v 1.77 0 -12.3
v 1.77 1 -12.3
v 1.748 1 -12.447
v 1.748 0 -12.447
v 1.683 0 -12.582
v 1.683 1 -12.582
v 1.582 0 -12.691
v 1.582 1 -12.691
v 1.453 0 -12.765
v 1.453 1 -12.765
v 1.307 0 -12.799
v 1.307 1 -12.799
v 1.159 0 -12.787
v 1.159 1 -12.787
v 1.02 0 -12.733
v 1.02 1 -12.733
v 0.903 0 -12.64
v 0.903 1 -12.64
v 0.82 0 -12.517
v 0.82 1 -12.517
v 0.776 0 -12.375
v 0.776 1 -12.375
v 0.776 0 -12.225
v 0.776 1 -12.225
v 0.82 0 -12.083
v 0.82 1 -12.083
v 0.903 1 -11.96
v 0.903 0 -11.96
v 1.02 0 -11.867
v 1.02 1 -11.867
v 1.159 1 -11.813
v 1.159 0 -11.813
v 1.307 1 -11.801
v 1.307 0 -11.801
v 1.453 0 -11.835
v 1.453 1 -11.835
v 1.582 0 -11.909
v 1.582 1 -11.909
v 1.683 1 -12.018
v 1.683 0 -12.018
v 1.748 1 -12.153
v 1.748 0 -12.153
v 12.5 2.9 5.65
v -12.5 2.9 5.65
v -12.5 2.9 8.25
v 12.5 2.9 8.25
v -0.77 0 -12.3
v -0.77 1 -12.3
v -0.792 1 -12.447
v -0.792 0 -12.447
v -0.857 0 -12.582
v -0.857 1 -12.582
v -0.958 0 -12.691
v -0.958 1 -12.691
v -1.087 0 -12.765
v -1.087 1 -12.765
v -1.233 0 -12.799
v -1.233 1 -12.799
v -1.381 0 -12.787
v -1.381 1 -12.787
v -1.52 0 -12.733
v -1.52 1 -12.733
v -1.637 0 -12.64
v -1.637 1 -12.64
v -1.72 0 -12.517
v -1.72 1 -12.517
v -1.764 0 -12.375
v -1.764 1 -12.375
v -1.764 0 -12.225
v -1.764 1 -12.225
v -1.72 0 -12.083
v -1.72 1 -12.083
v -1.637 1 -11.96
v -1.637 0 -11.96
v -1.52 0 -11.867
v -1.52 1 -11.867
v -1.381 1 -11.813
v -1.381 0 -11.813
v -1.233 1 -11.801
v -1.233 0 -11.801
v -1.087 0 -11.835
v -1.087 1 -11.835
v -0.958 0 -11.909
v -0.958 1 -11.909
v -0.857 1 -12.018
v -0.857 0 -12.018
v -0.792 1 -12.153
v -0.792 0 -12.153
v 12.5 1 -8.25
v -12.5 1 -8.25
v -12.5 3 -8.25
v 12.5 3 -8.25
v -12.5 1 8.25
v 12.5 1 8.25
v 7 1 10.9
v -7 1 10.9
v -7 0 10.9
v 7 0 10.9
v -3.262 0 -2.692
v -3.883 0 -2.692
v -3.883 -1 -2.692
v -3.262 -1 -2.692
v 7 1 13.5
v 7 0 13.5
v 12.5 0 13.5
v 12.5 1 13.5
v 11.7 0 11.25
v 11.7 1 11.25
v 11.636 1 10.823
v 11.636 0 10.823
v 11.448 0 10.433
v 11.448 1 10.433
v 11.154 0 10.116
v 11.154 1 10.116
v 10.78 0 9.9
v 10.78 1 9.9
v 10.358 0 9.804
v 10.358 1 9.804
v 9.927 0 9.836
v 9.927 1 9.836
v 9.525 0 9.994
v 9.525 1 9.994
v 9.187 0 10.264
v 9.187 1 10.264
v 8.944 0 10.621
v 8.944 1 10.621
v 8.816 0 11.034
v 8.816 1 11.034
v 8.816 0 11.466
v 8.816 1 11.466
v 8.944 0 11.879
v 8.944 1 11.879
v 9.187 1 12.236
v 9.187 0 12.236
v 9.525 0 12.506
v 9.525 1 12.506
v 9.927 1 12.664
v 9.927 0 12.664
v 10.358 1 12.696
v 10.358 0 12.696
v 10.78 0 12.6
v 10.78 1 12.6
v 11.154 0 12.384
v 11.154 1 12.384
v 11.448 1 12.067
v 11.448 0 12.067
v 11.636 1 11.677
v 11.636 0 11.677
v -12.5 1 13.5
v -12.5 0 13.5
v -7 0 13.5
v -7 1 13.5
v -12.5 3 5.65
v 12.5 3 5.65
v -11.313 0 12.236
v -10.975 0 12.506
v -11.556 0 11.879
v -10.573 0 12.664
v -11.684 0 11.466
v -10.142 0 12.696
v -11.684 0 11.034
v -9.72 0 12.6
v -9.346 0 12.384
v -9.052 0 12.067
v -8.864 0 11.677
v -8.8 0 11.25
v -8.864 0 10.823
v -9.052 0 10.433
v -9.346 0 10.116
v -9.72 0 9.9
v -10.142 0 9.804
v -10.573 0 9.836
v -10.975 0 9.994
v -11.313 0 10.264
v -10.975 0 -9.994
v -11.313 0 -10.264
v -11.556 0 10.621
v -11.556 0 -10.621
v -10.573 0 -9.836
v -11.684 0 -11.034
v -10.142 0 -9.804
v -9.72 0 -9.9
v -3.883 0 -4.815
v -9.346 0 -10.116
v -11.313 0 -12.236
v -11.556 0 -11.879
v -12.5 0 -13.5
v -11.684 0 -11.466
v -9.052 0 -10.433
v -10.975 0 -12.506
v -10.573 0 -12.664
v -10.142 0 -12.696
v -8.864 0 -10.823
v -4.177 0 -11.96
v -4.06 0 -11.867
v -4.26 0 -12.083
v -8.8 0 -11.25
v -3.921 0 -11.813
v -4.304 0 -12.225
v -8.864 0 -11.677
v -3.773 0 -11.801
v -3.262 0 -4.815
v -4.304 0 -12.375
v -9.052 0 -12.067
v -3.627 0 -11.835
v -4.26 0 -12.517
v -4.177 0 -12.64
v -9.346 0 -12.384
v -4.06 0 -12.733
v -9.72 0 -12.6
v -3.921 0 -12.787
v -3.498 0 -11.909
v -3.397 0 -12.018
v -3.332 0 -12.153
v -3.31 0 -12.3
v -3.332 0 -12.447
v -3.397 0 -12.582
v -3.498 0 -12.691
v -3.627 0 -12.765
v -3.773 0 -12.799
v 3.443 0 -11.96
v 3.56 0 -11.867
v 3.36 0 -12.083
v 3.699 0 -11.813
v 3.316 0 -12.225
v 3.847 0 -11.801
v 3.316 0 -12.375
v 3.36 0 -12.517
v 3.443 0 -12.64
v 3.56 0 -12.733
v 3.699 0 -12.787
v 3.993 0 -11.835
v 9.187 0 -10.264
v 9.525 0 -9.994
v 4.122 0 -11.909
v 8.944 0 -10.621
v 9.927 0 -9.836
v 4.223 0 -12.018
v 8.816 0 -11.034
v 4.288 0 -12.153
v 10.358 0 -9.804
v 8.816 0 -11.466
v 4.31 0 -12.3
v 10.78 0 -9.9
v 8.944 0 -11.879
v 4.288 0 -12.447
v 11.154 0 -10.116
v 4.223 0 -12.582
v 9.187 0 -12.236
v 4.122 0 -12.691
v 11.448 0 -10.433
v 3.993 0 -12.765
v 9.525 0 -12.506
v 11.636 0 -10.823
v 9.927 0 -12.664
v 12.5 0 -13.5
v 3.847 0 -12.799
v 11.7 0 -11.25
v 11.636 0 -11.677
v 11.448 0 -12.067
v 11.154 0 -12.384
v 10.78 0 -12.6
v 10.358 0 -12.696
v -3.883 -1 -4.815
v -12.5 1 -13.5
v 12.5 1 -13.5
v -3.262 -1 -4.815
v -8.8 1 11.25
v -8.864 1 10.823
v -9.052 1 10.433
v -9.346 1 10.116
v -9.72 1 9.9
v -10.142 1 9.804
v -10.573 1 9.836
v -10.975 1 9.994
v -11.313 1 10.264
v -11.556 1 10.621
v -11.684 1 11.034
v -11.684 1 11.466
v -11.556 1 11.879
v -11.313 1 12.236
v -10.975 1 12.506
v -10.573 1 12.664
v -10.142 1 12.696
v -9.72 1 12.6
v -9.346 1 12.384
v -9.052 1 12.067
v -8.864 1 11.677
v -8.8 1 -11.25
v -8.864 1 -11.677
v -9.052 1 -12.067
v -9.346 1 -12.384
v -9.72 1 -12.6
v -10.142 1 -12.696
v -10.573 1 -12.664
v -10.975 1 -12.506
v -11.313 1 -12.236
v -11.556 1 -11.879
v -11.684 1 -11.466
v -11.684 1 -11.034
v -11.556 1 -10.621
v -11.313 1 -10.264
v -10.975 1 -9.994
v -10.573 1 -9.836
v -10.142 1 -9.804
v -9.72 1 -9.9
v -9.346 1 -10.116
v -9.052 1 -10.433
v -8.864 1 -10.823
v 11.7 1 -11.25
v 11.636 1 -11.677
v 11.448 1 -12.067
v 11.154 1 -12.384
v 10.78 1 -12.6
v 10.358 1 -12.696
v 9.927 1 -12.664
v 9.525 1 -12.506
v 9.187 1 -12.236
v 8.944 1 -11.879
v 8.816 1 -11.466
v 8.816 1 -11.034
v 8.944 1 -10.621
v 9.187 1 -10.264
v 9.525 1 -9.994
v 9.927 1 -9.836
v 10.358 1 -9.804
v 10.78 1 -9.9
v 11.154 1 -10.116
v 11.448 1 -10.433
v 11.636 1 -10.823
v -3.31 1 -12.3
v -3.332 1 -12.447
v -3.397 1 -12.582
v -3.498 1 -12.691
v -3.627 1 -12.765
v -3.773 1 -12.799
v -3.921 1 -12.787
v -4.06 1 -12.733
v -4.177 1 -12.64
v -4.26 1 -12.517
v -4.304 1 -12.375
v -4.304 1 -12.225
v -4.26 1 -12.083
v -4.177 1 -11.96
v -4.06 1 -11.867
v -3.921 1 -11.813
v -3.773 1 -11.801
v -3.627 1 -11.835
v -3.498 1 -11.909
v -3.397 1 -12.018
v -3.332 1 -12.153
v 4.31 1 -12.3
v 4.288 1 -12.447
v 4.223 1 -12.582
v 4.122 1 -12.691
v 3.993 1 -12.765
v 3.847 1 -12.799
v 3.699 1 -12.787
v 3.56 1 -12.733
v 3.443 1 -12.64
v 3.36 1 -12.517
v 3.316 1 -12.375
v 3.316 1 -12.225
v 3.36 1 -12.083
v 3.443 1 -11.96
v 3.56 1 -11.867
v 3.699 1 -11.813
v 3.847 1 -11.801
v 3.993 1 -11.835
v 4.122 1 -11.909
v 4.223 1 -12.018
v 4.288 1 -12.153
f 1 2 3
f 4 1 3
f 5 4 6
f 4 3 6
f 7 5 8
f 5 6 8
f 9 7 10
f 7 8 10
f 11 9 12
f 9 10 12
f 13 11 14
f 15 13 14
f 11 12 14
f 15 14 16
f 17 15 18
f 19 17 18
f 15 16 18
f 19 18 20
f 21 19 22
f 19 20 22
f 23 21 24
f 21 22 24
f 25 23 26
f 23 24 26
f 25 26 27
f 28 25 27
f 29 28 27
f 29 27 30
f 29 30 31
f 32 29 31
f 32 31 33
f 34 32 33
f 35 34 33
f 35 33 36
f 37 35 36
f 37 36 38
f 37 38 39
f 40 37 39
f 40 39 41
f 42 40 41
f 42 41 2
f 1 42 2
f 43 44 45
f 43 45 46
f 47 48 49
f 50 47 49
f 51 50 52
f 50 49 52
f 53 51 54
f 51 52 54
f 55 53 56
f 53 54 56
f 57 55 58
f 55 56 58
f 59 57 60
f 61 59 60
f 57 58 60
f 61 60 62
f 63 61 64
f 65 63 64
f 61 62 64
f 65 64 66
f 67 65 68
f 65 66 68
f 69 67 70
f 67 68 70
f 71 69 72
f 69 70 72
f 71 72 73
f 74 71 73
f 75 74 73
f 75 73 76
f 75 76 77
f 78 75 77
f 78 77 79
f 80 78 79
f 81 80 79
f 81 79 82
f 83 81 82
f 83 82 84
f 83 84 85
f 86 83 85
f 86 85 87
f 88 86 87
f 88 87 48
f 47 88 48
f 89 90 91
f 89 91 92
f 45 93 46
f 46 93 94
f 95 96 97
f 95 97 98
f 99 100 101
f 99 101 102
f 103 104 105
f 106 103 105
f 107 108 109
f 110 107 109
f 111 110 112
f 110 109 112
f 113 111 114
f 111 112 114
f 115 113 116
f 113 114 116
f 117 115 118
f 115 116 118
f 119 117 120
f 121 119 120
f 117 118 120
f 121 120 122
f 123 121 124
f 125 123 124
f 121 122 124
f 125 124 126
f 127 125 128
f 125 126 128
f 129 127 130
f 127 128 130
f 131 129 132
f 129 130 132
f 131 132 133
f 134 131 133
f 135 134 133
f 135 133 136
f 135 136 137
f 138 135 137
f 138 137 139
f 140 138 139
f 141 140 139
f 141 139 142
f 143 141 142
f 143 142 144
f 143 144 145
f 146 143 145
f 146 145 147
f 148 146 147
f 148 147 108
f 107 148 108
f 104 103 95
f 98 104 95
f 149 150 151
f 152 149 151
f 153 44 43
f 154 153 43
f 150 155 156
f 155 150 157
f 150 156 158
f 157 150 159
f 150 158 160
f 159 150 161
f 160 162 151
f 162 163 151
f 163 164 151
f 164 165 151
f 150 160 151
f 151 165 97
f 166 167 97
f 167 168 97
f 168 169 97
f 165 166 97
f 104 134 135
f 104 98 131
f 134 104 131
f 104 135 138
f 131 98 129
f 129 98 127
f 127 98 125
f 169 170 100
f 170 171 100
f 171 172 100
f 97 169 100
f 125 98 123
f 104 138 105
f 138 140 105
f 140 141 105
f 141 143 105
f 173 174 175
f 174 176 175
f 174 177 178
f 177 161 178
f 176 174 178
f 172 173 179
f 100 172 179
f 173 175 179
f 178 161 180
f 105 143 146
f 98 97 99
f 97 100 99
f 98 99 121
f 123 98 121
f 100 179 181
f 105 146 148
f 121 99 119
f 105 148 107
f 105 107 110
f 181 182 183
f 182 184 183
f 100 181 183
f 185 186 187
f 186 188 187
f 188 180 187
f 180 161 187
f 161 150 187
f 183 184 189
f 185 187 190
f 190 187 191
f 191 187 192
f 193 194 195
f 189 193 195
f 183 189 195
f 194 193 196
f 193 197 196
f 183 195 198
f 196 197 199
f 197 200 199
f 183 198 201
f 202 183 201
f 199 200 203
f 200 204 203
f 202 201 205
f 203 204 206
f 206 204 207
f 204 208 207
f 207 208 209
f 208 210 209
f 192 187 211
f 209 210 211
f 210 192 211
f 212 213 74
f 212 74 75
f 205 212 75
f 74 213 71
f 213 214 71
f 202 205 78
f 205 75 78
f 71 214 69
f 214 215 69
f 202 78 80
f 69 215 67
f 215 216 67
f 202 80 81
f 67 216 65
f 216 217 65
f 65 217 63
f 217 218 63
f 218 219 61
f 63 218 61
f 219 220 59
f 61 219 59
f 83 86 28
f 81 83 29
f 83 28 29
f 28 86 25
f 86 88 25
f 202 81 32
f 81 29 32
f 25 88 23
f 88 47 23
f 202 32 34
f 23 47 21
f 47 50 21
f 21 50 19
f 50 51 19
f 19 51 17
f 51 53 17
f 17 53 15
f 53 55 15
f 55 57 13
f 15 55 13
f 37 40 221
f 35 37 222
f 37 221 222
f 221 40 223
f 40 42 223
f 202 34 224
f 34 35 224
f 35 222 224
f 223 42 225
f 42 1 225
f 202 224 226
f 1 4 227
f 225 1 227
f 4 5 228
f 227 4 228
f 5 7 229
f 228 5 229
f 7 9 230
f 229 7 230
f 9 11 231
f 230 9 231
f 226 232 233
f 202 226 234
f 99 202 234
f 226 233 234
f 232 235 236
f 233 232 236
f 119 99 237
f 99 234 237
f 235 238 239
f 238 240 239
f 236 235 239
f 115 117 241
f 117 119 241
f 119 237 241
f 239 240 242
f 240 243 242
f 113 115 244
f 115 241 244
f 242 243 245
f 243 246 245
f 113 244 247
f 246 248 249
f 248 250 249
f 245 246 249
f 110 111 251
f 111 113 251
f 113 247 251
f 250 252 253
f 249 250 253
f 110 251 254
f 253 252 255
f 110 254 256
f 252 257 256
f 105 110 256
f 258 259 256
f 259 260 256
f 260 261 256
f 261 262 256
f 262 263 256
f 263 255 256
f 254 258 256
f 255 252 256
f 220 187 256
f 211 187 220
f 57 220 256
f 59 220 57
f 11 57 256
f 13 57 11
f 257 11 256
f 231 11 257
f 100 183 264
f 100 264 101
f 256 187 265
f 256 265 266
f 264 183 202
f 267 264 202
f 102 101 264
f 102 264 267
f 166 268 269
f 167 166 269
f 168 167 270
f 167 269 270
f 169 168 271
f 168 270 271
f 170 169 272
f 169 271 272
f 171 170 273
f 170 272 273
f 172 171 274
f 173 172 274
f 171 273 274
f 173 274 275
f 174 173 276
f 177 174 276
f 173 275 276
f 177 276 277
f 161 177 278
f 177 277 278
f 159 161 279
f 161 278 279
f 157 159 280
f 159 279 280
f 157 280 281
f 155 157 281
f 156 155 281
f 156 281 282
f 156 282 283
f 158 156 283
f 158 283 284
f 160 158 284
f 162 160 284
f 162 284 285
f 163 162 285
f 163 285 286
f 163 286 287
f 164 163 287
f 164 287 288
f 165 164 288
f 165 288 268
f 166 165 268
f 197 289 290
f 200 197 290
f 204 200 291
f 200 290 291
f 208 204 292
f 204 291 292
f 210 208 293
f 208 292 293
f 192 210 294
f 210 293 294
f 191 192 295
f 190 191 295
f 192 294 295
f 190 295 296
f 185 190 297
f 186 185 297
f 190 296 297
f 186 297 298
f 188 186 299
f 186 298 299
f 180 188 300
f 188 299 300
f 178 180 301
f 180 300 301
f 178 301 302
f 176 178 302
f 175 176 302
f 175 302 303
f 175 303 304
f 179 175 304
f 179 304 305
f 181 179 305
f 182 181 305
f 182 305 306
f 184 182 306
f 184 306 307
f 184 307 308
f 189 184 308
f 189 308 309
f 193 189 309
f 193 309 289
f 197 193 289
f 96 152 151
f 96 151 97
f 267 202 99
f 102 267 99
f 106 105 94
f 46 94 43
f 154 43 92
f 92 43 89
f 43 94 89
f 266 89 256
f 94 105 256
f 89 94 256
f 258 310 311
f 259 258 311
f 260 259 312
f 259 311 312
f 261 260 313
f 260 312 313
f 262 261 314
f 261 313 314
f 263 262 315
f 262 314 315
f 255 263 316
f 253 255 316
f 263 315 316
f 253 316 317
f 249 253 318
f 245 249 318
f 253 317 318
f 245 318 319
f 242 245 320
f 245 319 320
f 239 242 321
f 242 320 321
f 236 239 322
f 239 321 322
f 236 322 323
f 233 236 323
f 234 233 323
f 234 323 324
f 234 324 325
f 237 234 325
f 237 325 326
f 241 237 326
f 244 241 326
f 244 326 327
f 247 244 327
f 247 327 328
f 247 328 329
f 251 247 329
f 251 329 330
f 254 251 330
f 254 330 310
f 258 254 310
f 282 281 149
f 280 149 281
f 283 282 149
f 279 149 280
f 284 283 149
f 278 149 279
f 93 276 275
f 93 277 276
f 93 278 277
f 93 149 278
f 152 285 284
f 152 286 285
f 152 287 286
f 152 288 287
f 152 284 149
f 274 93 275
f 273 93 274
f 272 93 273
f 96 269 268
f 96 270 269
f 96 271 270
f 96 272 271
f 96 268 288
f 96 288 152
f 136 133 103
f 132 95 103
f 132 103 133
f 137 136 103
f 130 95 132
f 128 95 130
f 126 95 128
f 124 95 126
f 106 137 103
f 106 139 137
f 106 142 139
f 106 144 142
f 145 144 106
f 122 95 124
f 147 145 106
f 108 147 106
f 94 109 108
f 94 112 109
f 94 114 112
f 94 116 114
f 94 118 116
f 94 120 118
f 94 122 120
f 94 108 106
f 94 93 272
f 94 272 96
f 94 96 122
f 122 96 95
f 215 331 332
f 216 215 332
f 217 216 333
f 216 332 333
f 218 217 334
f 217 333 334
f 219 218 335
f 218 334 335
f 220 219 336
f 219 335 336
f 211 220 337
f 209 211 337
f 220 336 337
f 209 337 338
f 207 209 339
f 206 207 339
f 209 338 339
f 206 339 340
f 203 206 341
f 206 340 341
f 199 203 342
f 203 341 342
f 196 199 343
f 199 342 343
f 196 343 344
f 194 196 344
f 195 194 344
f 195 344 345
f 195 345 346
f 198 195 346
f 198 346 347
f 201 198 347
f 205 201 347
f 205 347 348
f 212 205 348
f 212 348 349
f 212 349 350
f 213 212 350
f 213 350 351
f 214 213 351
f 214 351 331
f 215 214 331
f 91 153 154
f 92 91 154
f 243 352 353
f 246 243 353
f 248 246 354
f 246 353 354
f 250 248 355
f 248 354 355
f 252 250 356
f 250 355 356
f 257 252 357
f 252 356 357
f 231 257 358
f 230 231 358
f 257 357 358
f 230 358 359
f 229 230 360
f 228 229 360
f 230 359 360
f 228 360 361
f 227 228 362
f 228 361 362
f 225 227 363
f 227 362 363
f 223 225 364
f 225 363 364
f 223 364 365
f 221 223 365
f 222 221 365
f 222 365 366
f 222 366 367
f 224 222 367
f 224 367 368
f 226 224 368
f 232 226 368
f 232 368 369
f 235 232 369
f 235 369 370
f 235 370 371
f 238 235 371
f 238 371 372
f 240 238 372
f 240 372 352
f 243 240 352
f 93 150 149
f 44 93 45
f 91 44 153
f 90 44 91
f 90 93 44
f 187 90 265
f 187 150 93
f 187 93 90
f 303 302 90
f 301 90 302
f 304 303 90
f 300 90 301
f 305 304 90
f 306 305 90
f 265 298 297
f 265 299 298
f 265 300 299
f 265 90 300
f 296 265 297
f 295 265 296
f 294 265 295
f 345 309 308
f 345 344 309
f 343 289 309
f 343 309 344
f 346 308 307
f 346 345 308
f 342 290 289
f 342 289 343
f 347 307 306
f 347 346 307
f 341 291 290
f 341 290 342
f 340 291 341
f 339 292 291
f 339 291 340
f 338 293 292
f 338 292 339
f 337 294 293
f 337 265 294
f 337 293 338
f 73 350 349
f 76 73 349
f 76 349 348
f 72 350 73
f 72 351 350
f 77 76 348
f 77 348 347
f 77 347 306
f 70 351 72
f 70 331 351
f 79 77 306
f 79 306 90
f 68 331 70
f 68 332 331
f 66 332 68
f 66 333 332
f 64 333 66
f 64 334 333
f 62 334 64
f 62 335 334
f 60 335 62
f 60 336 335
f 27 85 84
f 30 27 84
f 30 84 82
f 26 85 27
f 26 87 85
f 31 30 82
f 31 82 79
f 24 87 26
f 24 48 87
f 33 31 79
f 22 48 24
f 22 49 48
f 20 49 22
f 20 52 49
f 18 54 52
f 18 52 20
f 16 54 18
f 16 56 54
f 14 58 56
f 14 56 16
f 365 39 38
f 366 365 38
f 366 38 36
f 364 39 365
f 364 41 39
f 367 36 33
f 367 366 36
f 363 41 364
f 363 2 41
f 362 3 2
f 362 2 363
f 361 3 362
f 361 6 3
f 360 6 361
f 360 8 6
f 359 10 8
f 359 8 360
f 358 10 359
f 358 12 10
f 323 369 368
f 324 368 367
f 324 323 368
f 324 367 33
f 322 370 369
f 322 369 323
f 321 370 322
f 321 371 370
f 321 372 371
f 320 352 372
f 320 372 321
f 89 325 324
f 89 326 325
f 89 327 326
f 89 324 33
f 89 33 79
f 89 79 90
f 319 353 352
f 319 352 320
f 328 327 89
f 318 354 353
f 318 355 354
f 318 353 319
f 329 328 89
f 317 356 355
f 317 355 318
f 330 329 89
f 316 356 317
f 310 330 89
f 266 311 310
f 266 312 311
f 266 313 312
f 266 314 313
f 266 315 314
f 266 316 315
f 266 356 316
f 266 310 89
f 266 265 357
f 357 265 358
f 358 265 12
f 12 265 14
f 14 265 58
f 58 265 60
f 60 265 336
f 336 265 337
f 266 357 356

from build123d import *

# Parameters (mm, degrees)
SKETCH_1_W          = 25
SKETCH_1_H          = 27
EXTRUDE_1_DEPTH     = 1
EXTRUDE_START       = -1
SKETCH_2_W          = 25
SKETCH_2_H          = 16.5
EXTRUDE_2_DEPTH     = 2.9
EXTRUDE_START_2     = -2.9
SKETCH_3_W          = 25
SKETCH_3_H          = 13.9
EXTRUDE_3_DEPTH     = 3
SKETCH_4_W          = 14
SKETCH_4_H          = 2.6
CUT_EXTRUDE_1_DEPTH = 2
SKETCH_6_R          = 1.45
SKETCH_6_R_2        = 0.5
CUT_EXTRUDE_2_DEPTH = 2
EXTRUDE_START_3     = -3
SKETCH_7_W          = 0.62130337
SKETCH_7_H          = 2.122786517
EXTRUDE_4_DEPTH     = 4


with BuildPart() as part:
    # 草图1 → 凸台-拉伸1 (new body)
    with BuildSketch(Plane(origin=(0, 0, 0), x_dir=(1, 0, 0), z_dir=(0, 1, 0))):
        Rectangle(SKETCH_1_W, SKETCH_1_H)
    extrude(amount=EXTRUDE_1_DEPTH)

    # 草图2 → 凸台-拉伸2 (add)
    with BuildSketch(Plane(origin=(0, 1, 0), x_dir=(1, 0, 0), z_dir=(0, 1, 0)).offset(EXTRUDE_START)):
        Rectangle(SKETCH_2_W, SKETCH_2_H)
    extrude(amount=EXTRUDE_2_DEPTH)

    # 草图3 → 凸台-拉伸3 (add)
    with BuildSketch(Plane(origin=(0, 2.9, 0), x_dir=(1, 0, 0), z_dir=(0, 1, 0)).offset(EXTRUDE_START_2)):
        with Locations((0, 1.3)):
            Rectangle(SKETCH_3_W, SKETCH_3_H)
    extrude(amount=EXTRUDE_3_DEPTH)

    # 草图4 → 切除-拉伸1 (cut, through all)
    with BuildSketch(Plane(origin=(0, 1, 0), x_dir=(1, 0, 0), z_dir=(0, 1, 0))):
        with Locations((0, -12.2)):
            Rectangle(SKETCH_4_W, SKETCH_4_H)
    extrude(amount=-CUT_EXTRUDE_1_DEPTH, mode=Mode.SUBTRACT)

    # 草图6 → 切除-拉伸2 (cut, through all)
    with BuildSketch(Plane(origin=(0, 1, 0), x_dir=(1, 0, 0), z_dir=(0, 1, 0))):
        with Locations((-10.25, 11.25)):
            Circle(SKETCH_6_R)
        with Locations((10.25, 11.25)):
            Circle(SKETCH_6_R)
        with Locations((-10.25, -11.25)):
            Circle(SKETCH_6_R)
        with Locations((10.25, -11.25)):
            Circle(SKETCH_6_R)
        with Locations((-3.81, 12.3)):
            Circle(SKETCH_6_R_2)
        with Locations((-1.27, 12.3)):
            Circle(SKETCH_6_R_2)
        with Locations((1.27, 12.3)):
            Circle(SKETCH_6_R_2)
        with Locations((3.81, 12.3)):
            Circle(SKETCH_6_R_2)
    extrude(amount=-CUT_EXTRUDE_2_DEPTH, mode=Mode.SUBTRACT)

    # 草图7 → 凸台-拉伸4 (add)
    with BuildSketch(Plane.XZ.offset(EXTRUDE_START_3)):
        with Locations((-3.572494382, -3.753707866)):
            Rectangle(SKETCH_7_W, SKETCH_7_H)
    extrude(amount=EXTRUDE_4_DEPTH)


solid = part.part
